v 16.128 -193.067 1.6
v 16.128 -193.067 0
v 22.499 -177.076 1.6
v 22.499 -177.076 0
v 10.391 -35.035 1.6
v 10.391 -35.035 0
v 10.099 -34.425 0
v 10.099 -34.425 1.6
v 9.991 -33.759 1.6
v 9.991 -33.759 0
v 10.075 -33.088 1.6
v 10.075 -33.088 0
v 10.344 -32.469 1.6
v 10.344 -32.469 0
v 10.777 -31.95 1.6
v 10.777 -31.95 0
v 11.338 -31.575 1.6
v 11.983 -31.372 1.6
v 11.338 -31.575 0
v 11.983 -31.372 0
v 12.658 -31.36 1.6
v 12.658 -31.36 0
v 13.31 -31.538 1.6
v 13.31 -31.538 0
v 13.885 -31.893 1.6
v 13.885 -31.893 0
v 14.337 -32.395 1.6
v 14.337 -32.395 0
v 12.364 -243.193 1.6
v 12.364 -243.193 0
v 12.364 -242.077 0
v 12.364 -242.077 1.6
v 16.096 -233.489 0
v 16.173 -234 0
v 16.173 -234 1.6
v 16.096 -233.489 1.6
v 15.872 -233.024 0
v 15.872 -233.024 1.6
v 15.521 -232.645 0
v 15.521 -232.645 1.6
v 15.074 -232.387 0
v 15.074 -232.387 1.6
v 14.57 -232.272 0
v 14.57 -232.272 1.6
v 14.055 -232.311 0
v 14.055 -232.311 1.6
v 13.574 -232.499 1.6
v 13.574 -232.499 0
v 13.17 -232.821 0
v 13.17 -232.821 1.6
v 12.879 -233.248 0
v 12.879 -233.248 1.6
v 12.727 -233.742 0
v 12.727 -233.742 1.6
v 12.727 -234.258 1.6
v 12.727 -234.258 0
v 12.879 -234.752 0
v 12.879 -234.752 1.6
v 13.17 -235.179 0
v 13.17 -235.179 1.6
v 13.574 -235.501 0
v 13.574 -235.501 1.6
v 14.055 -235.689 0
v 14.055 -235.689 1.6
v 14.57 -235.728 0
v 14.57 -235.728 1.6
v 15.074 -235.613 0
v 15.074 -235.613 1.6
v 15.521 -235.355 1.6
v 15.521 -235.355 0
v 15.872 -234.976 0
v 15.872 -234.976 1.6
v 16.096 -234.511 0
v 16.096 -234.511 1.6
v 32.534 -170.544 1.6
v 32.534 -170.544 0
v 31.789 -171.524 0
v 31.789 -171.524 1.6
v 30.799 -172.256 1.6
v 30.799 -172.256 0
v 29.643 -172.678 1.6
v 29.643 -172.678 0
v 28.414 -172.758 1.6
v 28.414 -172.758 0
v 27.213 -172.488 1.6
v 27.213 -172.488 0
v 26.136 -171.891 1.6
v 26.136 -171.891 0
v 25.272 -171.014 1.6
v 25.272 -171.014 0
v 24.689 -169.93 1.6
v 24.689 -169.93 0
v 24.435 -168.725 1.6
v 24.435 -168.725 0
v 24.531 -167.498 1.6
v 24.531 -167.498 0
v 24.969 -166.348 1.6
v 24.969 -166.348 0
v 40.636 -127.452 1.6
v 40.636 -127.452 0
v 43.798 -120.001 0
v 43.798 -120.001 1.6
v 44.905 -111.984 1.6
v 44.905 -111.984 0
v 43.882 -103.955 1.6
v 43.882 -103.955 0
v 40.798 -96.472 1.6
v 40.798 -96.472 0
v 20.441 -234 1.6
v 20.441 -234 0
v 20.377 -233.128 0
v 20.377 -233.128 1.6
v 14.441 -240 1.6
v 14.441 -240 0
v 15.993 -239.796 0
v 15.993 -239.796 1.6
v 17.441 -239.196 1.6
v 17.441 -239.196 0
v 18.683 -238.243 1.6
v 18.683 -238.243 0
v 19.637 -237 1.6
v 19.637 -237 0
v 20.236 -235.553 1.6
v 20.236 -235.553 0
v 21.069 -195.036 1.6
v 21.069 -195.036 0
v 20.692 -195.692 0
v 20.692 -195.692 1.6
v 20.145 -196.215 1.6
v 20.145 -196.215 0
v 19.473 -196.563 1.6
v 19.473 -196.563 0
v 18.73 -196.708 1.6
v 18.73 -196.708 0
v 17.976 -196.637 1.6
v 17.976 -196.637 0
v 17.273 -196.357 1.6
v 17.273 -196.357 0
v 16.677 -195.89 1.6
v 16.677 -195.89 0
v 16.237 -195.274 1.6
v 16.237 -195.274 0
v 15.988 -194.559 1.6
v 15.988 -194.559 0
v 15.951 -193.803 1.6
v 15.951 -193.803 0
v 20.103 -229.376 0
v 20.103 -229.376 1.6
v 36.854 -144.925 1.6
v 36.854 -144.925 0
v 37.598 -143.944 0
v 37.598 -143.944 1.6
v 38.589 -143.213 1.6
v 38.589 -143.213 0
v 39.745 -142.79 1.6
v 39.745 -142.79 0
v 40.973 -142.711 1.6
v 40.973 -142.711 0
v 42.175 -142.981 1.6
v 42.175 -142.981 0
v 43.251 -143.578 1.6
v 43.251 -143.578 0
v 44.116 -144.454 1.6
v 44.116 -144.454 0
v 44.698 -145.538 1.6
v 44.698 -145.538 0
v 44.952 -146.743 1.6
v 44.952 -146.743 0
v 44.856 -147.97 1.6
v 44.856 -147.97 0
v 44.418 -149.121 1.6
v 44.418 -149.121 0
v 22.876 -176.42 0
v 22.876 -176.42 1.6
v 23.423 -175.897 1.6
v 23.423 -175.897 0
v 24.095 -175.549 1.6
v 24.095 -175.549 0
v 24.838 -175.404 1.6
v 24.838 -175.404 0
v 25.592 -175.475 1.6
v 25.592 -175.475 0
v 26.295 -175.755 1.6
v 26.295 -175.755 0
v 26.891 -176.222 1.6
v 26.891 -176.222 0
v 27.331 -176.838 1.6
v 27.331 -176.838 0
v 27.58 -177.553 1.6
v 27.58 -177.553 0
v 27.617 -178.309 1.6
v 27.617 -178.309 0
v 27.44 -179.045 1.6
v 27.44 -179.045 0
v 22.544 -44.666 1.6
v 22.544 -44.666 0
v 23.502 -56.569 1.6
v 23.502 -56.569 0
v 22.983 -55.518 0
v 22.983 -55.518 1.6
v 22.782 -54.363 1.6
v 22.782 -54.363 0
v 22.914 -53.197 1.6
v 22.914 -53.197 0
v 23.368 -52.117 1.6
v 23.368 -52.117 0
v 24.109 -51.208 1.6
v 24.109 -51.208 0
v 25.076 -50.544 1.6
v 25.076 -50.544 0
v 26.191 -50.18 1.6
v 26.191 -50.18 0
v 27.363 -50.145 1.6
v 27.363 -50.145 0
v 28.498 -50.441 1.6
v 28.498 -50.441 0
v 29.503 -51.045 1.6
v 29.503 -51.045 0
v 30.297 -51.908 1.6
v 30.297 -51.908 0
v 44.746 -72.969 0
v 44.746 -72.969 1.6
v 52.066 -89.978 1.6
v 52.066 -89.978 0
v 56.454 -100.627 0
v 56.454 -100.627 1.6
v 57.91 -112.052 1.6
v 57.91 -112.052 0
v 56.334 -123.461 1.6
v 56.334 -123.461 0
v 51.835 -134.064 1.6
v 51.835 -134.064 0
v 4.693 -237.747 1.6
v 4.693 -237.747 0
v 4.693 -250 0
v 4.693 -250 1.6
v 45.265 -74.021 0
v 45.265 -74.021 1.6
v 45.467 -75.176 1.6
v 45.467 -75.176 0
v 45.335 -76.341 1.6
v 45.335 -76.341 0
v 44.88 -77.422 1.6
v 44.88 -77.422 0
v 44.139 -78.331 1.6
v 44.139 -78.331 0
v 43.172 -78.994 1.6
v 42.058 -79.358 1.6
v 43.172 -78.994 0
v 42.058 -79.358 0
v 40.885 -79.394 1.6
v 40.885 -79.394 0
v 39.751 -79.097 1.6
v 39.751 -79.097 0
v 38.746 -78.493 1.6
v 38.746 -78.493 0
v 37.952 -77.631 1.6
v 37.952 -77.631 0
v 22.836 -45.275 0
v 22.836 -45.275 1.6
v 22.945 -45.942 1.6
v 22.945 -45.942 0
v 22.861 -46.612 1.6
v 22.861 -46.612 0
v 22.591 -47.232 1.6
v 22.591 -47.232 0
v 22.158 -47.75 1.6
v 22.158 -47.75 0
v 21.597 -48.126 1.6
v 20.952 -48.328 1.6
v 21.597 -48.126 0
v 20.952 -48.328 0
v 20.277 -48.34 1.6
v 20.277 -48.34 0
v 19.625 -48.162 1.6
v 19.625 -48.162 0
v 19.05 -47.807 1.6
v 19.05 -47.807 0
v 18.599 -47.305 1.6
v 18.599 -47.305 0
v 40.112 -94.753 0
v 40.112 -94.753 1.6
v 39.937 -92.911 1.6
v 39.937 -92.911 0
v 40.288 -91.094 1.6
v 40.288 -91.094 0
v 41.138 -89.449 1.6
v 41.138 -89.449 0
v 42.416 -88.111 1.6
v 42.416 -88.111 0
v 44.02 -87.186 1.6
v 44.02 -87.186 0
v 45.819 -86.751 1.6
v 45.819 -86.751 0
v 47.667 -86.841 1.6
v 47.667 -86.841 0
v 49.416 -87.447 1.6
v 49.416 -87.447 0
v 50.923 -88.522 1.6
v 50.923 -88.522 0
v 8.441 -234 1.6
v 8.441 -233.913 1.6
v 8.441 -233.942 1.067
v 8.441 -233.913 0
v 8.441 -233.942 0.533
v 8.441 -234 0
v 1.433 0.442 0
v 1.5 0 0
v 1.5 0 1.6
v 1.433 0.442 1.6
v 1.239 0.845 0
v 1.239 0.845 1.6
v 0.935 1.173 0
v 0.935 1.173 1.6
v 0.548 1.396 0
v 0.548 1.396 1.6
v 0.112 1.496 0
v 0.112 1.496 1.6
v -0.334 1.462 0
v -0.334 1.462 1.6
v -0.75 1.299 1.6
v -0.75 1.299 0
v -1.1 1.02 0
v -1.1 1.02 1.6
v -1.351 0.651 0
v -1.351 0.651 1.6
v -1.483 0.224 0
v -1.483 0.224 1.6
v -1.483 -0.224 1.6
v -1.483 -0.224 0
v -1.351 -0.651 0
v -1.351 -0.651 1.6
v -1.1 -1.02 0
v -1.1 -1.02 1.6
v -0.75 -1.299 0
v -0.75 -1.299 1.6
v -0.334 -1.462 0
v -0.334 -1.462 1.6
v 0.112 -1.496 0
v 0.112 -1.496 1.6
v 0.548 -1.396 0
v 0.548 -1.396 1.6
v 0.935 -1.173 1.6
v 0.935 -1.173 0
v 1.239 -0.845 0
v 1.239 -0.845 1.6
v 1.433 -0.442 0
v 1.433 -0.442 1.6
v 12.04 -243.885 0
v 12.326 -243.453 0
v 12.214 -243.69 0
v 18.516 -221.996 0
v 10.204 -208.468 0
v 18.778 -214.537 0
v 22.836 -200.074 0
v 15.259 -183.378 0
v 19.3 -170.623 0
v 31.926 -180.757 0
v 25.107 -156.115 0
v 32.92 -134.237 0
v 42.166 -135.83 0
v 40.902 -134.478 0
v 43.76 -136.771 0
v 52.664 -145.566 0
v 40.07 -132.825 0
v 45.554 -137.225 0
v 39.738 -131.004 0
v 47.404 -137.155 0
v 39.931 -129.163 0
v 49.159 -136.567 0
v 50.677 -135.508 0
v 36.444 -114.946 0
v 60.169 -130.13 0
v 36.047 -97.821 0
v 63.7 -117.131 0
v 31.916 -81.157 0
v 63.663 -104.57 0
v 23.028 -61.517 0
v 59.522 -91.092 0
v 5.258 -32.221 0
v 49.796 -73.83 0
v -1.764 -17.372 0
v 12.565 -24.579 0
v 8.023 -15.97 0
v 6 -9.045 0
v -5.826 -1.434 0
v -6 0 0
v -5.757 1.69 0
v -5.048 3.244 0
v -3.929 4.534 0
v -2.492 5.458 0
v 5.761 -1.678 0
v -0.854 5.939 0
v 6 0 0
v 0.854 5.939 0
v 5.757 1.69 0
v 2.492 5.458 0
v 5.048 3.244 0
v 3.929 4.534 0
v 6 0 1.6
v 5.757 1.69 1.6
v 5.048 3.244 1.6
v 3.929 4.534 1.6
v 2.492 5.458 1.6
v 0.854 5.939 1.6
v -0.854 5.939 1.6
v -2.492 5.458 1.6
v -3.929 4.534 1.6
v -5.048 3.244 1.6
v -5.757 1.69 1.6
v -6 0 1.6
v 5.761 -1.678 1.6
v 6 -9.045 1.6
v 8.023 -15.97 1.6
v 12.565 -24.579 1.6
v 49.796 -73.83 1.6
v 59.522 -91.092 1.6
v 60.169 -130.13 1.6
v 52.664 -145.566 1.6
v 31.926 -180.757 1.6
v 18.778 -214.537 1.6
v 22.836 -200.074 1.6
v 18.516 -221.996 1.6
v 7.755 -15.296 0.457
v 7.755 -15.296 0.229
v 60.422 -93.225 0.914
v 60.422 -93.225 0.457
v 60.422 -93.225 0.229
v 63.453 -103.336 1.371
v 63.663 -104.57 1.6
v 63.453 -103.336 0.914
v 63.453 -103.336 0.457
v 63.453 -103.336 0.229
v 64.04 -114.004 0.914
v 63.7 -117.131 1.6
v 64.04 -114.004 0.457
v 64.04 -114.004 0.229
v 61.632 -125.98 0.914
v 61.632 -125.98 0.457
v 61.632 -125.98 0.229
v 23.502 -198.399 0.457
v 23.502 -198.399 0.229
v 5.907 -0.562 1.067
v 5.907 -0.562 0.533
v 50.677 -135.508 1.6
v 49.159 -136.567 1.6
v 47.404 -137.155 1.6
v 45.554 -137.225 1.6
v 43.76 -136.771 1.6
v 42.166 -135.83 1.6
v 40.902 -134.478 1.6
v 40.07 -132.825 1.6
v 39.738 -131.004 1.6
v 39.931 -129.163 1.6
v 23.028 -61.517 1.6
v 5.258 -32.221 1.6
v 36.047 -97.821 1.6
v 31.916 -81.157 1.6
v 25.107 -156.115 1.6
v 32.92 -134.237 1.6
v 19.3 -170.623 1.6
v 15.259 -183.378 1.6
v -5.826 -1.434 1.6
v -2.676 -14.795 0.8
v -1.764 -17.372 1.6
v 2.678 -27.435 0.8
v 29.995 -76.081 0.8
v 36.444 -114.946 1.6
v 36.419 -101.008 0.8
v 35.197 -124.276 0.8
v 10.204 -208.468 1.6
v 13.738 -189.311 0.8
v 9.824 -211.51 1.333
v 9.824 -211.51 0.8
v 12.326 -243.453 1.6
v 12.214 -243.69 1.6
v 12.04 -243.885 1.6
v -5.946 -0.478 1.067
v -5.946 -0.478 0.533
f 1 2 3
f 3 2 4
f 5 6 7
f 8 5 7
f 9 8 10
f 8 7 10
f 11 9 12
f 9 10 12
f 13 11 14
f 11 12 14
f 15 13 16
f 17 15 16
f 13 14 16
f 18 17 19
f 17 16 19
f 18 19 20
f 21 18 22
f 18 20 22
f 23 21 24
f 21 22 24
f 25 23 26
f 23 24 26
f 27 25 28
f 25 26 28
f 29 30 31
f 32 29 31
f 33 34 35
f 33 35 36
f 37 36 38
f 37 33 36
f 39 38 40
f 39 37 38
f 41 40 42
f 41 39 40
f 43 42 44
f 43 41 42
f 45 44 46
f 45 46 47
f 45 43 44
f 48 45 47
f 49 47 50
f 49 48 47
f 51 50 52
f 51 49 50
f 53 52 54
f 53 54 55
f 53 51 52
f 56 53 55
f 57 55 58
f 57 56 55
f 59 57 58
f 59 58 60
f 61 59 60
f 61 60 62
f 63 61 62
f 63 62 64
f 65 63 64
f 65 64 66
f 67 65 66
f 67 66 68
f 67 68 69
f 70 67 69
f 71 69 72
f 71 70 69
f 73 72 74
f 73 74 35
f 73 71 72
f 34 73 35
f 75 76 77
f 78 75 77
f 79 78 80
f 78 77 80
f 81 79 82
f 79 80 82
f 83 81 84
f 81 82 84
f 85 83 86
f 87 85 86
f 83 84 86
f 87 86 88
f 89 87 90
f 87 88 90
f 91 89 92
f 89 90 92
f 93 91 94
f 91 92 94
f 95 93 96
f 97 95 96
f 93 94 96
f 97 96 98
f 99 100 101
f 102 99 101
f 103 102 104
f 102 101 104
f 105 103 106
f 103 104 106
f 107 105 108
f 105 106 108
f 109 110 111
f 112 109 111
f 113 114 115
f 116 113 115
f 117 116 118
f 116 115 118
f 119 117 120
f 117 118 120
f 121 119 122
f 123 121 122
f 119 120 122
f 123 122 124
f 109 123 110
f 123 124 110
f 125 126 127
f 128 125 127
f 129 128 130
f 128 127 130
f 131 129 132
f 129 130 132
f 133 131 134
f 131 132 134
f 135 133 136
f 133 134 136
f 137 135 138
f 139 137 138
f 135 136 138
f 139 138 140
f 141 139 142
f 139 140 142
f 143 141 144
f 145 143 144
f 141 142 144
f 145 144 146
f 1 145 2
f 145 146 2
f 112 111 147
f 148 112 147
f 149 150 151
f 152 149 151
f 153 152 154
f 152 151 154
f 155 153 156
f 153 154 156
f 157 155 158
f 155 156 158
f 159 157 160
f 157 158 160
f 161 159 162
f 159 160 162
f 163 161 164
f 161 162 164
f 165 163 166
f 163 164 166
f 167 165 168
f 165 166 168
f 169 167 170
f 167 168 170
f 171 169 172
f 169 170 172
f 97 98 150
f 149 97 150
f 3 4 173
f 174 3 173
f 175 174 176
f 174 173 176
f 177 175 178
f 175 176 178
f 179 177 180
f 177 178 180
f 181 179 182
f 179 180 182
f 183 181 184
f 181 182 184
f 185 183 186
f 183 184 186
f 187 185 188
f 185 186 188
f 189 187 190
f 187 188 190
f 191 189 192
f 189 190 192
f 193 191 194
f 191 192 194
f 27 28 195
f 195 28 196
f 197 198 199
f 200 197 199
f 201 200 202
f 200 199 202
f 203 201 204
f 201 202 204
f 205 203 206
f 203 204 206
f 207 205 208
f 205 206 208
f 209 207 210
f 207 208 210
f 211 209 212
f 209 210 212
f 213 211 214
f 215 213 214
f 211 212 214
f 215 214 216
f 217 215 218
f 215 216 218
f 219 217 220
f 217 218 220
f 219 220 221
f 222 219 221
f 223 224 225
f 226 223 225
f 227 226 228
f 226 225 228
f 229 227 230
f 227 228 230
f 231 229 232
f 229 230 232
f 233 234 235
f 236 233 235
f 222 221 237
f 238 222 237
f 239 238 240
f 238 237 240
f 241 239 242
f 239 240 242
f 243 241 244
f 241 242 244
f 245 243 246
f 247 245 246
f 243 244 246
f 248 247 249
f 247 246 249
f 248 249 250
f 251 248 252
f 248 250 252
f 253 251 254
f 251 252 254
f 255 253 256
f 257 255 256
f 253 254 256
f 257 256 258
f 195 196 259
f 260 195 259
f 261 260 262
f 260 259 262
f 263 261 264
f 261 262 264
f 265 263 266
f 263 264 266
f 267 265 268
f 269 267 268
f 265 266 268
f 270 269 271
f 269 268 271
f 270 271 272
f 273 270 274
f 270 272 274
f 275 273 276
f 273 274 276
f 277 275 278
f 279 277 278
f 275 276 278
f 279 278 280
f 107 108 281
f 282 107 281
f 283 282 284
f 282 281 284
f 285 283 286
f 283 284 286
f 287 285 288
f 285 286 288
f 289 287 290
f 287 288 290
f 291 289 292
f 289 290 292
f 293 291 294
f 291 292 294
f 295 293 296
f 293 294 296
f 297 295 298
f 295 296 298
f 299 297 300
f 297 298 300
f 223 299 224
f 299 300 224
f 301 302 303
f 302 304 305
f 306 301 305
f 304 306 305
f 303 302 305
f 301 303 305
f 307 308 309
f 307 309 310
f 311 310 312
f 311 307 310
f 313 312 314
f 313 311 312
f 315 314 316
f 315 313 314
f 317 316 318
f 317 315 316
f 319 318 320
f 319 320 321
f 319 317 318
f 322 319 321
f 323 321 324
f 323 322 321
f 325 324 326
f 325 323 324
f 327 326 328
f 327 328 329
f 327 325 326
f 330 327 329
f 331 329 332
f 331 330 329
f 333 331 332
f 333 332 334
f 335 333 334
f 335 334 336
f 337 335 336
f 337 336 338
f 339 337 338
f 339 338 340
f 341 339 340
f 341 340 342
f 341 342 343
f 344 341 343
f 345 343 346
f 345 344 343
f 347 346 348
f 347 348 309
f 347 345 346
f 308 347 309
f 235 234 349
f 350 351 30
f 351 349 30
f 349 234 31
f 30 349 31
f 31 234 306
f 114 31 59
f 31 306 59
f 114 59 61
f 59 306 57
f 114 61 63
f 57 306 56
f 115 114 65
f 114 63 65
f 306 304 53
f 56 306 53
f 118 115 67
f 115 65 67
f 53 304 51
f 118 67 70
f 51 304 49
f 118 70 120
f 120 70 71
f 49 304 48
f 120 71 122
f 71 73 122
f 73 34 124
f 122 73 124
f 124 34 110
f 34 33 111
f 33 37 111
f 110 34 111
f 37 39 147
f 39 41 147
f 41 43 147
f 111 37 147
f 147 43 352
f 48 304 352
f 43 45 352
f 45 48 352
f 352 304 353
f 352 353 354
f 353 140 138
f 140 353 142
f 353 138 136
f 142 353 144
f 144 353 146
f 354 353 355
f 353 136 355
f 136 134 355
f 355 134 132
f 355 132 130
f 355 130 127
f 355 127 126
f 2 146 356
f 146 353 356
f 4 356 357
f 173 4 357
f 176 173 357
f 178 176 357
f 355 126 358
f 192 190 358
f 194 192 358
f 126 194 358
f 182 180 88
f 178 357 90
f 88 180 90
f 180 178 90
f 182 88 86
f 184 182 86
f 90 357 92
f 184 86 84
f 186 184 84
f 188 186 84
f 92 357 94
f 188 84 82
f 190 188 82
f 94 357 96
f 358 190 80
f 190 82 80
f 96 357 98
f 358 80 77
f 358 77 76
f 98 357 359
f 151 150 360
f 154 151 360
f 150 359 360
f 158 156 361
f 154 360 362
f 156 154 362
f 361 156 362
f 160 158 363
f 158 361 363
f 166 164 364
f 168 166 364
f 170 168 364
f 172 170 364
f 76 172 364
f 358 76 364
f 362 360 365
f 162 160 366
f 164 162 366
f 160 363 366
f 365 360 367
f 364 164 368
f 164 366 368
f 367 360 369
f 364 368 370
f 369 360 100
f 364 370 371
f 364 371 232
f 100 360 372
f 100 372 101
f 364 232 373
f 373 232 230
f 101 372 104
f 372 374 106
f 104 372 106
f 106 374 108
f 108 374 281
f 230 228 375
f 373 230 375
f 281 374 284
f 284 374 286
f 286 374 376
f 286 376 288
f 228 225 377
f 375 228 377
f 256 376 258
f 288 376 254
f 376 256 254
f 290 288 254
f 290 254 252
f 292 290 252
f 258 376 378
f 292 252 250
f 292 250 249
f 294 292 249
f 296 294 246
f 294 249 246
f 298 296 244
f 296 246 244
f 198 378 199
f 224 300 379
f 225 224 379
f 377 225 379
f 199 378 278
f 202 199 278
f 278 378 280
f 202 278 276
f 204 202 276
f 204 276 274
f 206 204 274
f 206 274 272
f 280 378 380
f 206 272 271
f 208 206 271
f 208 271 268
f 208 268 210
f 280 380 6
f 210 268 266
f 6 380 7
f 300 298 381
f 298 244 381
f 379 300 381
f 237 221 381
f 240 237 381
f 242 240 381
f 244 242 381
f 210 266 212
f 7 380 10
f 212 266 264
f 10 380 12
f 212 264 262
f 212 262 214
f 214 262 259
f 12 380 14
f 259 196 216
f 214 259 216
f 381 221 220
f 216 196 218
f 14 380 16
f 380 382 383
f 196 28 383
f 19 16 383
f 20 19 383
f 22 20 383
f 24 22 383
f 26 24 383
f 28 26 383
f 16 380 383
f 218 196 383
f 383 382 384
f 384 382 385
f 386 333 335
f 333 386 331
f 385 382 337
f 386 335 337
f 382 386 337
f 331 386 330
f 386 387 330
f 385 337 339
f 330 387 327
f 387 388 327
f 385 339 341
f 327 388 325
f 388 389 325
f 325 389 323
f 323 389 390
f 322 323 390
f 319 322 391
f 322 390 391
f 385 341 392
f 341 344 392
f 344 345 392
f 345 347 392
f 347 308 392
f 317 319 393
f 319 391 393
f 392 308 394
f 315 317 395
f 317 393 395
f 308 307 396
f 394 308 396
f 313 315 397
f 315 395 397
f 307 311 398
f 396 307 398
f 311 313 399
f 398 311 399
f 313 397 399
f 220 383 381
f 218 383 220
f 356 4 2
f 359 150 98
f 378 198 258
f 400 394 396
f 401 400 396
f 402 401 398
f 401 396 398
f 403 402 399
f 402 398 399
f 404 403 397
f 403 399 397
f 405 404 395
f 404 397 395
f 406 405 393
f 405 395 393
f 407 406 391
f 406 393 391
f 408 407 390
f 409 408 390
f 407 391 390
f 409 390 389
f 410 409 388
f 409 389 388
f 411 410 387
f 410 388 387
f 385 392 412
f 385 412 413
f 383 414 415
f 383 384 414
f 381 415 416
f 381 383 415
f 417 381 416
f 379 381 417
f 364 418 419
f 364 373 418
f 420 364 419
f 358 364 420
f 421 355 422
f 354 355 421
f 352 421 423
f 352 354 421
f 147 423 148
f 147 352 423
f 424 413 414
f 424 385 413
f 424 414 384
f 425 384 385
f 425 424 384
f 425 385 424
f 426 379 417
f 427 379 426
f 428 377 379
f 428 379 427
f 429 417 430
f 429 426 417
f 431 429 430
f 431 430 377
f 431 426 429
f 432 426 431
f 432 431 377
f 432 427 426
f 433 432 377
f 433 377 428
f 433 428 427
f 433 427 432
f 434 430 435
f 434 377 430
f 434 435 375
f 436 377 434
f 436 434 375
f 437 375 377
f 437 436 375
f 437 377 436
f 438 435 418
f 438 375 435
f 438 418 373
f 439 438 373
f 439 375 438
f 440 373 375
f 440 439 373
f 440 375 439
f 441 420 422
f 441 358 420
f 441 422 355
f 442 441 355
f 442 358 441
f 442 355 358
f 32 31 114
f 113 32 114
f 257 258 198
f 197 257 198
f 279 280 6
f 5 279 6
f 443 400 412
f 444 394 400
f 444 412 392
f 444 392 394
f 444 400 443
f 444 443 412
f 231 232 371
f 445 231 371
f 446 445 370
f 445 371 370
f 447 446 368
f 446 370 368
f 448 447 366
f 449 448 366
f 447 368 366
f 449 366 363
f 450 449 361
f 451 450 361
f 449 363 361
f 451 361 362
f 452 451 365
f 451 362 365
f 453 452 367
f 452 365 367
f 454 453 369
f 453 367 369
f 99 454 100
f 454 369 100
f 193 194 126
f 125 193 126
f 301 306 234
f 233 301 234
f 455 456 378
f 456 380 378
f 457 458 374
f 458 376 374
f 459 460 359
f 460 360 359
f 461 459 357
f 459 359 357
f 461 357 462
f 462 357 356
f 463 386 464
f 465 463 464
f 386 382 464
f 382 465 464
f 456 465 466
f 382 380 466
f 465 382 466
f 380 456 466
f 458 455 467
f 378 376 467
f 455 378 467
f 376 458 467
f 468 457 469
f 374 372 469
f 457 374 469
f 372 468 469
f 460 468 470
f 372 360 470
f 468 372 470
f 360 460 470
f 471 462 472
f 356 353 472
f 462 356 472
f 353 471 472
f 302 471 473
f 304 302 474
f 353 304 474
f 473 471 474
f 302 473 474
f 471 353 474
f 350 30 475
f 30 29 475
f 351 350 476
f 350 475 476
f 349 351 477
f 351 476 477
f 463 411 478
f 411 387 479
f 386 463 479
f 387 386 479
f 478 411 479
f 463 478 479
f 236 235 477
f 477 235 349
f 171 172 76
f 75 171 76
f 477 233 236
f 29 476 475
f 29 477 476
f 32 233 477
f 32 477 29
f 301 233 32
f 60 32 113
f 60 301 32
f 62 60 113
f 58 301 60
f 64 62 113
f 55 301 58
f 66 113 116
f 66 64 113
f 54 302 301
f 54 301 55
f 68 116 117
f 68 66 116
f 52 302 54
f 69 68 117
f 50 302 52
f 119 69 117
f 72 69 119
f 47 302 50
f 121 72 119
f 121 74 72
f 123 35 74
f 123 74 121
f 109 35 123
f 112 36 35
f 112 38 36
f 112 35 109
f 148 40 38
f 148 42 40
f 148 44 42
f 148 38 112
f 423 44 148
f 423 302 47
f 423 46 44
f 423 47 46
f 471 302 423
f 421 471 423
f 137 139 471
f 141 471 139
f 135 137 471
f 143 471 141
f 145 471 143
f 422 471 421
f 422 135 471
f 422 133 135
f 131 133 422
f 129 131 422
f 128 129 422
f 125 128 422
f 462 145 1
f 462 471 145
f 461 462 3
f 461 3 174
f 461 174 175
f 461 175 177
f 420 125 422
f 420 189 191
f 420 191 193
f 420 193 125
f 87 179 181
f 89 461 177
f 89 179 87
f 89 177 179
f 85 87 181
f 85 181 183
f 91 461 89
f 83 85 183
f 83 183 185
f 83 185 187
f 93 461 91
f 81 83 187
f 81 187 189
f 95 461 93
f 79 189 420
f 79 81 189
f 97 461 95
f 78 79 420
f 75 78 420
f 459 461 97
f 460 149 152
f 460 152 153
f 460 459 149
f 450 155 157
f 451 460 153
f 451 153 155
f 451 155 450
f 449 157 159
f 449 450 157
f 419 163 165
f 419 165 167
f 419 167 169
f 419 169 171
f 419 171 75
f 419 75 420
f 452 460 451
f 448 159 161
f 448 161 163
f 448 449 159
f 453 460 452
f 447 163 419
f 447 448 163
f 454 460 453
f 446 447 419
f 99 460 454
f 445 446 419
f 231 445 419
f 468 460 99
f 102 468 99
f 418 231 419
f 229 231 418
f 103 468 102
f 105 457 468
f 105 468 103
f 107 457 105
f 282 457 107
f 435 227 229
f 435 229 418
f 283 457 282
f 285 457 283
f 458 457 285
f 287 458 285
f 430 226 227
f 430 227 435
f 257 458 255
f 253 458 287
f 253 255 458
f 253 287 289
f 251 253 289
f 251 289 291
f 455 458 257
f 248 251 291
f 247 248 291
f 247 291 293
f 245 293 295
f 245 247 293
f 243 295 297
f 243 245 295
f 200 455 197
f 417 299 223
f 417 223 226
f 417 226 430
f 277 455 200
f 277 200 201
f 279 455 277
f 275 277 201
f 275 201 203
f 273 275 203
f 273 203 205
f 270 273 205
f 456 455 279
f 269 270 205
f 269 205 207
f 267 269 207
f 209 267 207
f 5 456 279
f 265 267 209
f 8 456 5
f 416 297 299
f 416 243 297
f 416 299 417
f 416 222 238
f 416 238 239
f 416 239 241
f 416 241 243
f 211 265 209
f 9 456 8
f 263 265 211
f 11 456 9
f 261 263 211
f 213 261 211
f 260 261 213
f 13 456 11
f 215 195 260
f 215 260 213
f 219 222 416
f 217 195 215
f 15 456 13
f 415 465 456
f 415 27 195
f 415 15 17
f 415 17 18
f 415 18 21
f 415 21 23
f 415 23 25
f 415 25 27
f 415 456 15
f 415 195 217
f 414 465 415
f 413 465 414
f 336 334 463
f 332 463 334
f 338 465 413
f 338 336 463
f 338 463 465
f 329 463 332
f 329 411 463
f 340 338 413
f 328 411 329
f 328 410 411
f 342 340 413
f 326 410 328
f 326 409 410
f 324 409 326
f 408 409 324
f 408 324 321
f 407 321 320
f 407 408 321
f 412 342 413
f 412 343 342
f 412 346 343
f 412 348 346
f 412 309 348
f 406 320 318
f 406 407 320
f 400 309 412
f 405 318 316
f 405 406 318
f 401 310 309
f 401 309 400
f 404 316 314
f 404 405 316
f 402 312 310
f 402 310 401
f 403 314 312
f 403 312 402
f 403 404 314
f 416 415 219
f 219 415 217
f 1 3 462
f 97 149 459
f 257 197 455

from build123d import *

# Parameters (mm, degrees)
SKETCH2_R           = 1.732831624
SKETCH2_R_2         = 1.5
BOSS_EXTRUDE1_DEPTH = 1.6
FILLET1_R           = 0.9


with BuildPart() as part:
    # Sketch2 → Boss-Extrude1 (new body)
    with BuildSketch(Plane.XY):
        with BuildLine():
            Line((12.36381558, -242.076716149), (14.440531728, -240))
            ThreePointArc((14.440531728, -240), (18.683172415, -238.242640687), (20.440531728, -234))
            Line((20.440531728, -234), (20.376776694, -233.127649323))
            Line((20.376776694, -233.127649323), (20.102586749, -229.375948963))
            add(Edge.make_bspline(
                [(5.760529685, -1.678447518), (4.706168107, -11.302243391), (12.217634734, -25.347438804), (34.199359814, -53.085377705), (65.366773578, -90.301906703), (66.300443832, -122.098297696), (41.723995788, -164.536388316), (24.889665672, -189.788708641), (16.343002308, -219.119804153), (20.102586749, -229.375948963)],
                knots=[0.007063934, 0.007063934, 0.007063934, 0.007063934, 0.129411028, 0.209716388, 0.484272282, 0.700996914, 0.743032739, 0.904630537, 1, 1, 1, 1], degree=3))
            add(Edge.make_bspline(
                [(6, 0), (5.900912673, -0.563337962), (5.821405181, -1.122800041), (5.760529685, -1.678447518)],
                knots=[0, 0, 0, 0, 0.007063934, 0.007063934, 0.007063934, 0.007063934], degree=3))
            ThreePointArc((6, 0), (0, 6), (-6, 0))
            add(Edge.make_bspline(
                [(-6, 0), (-5.947507224, -0.478736658), (-5.88953799, -0.956599626), (-5.826229006, -1.433546502)],
                knots=[0, 0, 0, 0, 0.005833112, 0.005833112, 0.005833112, 0.005833112], degree=3))
            add(Edge.make_bspline(
                [(-5.826229006, -1.433546502), (-4.618474425, -10.532330434), (1.928964748, -28.745336793), (22.583192603, -58.284164555), (41.843243219, -98.733795743), (32.49180138, -140.234054147), (13.549189316, -181.378206446), (8.606428753, -211.799370681), (8.441165108, -233.9128211)],
                knots=[0.005833112, 0.005833112, 0.005833112, 0.005833112, 0.117112228, 0.237052563, 0.446401191, 0.635487594, 0.729133481, 0.999644507, 0.999644507, 0.999644507, 0.999644507], degree=3))
            add(Edge.make_bspline(
                [(8.441165108, -233.9128211), (8.440947927, -233.941881572), (8.4407368, -233.970941207), (8.440531728, -234)],
                knots=[0.999644507, 0.999644507, 0.999644507, 0.999644507, 1, 1, 1, 1], degree=3))
            Line((8.440531728, -234), (4.69307475, -237.747456979))
            Line((4.69307475, -237.747456979), (4.69307475, -250))
            Line((4.69307475, -250), (12.36381558, -243.615321662))
            Line((12.36381558, -243.615321662), (12.36381558, -242.076716149))
        make_face()
        with Locations((14.440531728, -234)):
            Circle(SKETCH2_R, mode=Mode.SUBTRACT)
        with BuildLine():
            ThreePointArc((22.498938935, -177.076225236), (25.95355019, -175.589974713), (27.439800713, -179.044585967))
            Line((27.439800713, -179.044585967), (21.069181187, -195.035735367))
            ThreePointArc((21.069181187, -195.035735367), (17.614569933, -196.521985891), (16.128319409, -193.067374636))
            Line((16.128319409, -193.067374636), (22.498938935, -177.076225236))
        make_face(mode=Mode.SUBTRACT)
        with BuildLine():
            ThreePointArc((36.853945865, -144.924585848), (42.734141403, -143.240646978), (44.418080273, -149.120842516))
            Line((44.418080273, -149.120842516), (32.533504232, -170.543872052))
            ThreePointArc((32.533504232, -170.543872052), (26.653308694, -172.227810921), (24.969369824, -166.347615383))
            Line((24.969369824, -166.347615383), (36.853945865, -144.924585848))
        make_face(mode=Mode.SUBTRACT)
        Circle(SKETCH2_R_2, mode=Mode.SUBTRACT)
        with BuildLine():
            ThreePointArc((22.544281842, -44.665829407), (21.891101421, -47.95818053), (18.598750298, -47.305000109))
            Line((18.598750298, -47.305000109), (10.391049808, -35.034576995))
            ThreePointArc((10.391049808, -35.034576995), (11.044230229, -31.742225872), (14.336581352, -32.395406293))
            Line((14.336581352, -32.395406293), (22.544281842, -44.665829407))
        make_face(mode=Mode.SUBTRACT)
        with BuildLine():
            ThreePointArc((23.502490938, -56.569318152), (24.569058509, -50.841378017), (30.296998644, -51.907945588))
            Line((30.296998644, -51.907945588), (44.746058819, -72.969177952))
            ThreePointArc((44.746058819, -72.969177952), (43.679491248, -78.697118087), (37.951551113, -77.630550516))
            Line((37.951551113, -77.630550516), (23.502490938, -56.569318152))
        make_face(mode=Mode.SUBTRACT)
        with BuildLine():
            ThreePointArc((52.065784517, -89.977573962), (57.91024769, -112.052048287), (51.835025839, -134.064132377))
            ThreePointArc((51.835025839, -134.064132377), (42.929443894, -136.357563202), (40.636013069, -127.451981257))
            ThreePointArc((40.636013069, -127.451981257), (44.905102719, -111.983976517), (40.798168379, -96.472129839))
            ThreePointArc((40.798168379, -96.472129839), (43.18469851, -87.591043831), (52.065784517, -89.977573962))
        make_face(mode=Mode.SUBTRACT)
    extrude(amount=BOSS_EXTRUDE1_DEPTH)

    # Fillet1
    fillet1_edges = [part.edges().sort_by_distance(p)[0] for p in [
        (12.36381558, -243.615321662, 0.8),
    ]]
    fillet(fillet1_edges, radius=FILLET1_R)


solid = part.part
